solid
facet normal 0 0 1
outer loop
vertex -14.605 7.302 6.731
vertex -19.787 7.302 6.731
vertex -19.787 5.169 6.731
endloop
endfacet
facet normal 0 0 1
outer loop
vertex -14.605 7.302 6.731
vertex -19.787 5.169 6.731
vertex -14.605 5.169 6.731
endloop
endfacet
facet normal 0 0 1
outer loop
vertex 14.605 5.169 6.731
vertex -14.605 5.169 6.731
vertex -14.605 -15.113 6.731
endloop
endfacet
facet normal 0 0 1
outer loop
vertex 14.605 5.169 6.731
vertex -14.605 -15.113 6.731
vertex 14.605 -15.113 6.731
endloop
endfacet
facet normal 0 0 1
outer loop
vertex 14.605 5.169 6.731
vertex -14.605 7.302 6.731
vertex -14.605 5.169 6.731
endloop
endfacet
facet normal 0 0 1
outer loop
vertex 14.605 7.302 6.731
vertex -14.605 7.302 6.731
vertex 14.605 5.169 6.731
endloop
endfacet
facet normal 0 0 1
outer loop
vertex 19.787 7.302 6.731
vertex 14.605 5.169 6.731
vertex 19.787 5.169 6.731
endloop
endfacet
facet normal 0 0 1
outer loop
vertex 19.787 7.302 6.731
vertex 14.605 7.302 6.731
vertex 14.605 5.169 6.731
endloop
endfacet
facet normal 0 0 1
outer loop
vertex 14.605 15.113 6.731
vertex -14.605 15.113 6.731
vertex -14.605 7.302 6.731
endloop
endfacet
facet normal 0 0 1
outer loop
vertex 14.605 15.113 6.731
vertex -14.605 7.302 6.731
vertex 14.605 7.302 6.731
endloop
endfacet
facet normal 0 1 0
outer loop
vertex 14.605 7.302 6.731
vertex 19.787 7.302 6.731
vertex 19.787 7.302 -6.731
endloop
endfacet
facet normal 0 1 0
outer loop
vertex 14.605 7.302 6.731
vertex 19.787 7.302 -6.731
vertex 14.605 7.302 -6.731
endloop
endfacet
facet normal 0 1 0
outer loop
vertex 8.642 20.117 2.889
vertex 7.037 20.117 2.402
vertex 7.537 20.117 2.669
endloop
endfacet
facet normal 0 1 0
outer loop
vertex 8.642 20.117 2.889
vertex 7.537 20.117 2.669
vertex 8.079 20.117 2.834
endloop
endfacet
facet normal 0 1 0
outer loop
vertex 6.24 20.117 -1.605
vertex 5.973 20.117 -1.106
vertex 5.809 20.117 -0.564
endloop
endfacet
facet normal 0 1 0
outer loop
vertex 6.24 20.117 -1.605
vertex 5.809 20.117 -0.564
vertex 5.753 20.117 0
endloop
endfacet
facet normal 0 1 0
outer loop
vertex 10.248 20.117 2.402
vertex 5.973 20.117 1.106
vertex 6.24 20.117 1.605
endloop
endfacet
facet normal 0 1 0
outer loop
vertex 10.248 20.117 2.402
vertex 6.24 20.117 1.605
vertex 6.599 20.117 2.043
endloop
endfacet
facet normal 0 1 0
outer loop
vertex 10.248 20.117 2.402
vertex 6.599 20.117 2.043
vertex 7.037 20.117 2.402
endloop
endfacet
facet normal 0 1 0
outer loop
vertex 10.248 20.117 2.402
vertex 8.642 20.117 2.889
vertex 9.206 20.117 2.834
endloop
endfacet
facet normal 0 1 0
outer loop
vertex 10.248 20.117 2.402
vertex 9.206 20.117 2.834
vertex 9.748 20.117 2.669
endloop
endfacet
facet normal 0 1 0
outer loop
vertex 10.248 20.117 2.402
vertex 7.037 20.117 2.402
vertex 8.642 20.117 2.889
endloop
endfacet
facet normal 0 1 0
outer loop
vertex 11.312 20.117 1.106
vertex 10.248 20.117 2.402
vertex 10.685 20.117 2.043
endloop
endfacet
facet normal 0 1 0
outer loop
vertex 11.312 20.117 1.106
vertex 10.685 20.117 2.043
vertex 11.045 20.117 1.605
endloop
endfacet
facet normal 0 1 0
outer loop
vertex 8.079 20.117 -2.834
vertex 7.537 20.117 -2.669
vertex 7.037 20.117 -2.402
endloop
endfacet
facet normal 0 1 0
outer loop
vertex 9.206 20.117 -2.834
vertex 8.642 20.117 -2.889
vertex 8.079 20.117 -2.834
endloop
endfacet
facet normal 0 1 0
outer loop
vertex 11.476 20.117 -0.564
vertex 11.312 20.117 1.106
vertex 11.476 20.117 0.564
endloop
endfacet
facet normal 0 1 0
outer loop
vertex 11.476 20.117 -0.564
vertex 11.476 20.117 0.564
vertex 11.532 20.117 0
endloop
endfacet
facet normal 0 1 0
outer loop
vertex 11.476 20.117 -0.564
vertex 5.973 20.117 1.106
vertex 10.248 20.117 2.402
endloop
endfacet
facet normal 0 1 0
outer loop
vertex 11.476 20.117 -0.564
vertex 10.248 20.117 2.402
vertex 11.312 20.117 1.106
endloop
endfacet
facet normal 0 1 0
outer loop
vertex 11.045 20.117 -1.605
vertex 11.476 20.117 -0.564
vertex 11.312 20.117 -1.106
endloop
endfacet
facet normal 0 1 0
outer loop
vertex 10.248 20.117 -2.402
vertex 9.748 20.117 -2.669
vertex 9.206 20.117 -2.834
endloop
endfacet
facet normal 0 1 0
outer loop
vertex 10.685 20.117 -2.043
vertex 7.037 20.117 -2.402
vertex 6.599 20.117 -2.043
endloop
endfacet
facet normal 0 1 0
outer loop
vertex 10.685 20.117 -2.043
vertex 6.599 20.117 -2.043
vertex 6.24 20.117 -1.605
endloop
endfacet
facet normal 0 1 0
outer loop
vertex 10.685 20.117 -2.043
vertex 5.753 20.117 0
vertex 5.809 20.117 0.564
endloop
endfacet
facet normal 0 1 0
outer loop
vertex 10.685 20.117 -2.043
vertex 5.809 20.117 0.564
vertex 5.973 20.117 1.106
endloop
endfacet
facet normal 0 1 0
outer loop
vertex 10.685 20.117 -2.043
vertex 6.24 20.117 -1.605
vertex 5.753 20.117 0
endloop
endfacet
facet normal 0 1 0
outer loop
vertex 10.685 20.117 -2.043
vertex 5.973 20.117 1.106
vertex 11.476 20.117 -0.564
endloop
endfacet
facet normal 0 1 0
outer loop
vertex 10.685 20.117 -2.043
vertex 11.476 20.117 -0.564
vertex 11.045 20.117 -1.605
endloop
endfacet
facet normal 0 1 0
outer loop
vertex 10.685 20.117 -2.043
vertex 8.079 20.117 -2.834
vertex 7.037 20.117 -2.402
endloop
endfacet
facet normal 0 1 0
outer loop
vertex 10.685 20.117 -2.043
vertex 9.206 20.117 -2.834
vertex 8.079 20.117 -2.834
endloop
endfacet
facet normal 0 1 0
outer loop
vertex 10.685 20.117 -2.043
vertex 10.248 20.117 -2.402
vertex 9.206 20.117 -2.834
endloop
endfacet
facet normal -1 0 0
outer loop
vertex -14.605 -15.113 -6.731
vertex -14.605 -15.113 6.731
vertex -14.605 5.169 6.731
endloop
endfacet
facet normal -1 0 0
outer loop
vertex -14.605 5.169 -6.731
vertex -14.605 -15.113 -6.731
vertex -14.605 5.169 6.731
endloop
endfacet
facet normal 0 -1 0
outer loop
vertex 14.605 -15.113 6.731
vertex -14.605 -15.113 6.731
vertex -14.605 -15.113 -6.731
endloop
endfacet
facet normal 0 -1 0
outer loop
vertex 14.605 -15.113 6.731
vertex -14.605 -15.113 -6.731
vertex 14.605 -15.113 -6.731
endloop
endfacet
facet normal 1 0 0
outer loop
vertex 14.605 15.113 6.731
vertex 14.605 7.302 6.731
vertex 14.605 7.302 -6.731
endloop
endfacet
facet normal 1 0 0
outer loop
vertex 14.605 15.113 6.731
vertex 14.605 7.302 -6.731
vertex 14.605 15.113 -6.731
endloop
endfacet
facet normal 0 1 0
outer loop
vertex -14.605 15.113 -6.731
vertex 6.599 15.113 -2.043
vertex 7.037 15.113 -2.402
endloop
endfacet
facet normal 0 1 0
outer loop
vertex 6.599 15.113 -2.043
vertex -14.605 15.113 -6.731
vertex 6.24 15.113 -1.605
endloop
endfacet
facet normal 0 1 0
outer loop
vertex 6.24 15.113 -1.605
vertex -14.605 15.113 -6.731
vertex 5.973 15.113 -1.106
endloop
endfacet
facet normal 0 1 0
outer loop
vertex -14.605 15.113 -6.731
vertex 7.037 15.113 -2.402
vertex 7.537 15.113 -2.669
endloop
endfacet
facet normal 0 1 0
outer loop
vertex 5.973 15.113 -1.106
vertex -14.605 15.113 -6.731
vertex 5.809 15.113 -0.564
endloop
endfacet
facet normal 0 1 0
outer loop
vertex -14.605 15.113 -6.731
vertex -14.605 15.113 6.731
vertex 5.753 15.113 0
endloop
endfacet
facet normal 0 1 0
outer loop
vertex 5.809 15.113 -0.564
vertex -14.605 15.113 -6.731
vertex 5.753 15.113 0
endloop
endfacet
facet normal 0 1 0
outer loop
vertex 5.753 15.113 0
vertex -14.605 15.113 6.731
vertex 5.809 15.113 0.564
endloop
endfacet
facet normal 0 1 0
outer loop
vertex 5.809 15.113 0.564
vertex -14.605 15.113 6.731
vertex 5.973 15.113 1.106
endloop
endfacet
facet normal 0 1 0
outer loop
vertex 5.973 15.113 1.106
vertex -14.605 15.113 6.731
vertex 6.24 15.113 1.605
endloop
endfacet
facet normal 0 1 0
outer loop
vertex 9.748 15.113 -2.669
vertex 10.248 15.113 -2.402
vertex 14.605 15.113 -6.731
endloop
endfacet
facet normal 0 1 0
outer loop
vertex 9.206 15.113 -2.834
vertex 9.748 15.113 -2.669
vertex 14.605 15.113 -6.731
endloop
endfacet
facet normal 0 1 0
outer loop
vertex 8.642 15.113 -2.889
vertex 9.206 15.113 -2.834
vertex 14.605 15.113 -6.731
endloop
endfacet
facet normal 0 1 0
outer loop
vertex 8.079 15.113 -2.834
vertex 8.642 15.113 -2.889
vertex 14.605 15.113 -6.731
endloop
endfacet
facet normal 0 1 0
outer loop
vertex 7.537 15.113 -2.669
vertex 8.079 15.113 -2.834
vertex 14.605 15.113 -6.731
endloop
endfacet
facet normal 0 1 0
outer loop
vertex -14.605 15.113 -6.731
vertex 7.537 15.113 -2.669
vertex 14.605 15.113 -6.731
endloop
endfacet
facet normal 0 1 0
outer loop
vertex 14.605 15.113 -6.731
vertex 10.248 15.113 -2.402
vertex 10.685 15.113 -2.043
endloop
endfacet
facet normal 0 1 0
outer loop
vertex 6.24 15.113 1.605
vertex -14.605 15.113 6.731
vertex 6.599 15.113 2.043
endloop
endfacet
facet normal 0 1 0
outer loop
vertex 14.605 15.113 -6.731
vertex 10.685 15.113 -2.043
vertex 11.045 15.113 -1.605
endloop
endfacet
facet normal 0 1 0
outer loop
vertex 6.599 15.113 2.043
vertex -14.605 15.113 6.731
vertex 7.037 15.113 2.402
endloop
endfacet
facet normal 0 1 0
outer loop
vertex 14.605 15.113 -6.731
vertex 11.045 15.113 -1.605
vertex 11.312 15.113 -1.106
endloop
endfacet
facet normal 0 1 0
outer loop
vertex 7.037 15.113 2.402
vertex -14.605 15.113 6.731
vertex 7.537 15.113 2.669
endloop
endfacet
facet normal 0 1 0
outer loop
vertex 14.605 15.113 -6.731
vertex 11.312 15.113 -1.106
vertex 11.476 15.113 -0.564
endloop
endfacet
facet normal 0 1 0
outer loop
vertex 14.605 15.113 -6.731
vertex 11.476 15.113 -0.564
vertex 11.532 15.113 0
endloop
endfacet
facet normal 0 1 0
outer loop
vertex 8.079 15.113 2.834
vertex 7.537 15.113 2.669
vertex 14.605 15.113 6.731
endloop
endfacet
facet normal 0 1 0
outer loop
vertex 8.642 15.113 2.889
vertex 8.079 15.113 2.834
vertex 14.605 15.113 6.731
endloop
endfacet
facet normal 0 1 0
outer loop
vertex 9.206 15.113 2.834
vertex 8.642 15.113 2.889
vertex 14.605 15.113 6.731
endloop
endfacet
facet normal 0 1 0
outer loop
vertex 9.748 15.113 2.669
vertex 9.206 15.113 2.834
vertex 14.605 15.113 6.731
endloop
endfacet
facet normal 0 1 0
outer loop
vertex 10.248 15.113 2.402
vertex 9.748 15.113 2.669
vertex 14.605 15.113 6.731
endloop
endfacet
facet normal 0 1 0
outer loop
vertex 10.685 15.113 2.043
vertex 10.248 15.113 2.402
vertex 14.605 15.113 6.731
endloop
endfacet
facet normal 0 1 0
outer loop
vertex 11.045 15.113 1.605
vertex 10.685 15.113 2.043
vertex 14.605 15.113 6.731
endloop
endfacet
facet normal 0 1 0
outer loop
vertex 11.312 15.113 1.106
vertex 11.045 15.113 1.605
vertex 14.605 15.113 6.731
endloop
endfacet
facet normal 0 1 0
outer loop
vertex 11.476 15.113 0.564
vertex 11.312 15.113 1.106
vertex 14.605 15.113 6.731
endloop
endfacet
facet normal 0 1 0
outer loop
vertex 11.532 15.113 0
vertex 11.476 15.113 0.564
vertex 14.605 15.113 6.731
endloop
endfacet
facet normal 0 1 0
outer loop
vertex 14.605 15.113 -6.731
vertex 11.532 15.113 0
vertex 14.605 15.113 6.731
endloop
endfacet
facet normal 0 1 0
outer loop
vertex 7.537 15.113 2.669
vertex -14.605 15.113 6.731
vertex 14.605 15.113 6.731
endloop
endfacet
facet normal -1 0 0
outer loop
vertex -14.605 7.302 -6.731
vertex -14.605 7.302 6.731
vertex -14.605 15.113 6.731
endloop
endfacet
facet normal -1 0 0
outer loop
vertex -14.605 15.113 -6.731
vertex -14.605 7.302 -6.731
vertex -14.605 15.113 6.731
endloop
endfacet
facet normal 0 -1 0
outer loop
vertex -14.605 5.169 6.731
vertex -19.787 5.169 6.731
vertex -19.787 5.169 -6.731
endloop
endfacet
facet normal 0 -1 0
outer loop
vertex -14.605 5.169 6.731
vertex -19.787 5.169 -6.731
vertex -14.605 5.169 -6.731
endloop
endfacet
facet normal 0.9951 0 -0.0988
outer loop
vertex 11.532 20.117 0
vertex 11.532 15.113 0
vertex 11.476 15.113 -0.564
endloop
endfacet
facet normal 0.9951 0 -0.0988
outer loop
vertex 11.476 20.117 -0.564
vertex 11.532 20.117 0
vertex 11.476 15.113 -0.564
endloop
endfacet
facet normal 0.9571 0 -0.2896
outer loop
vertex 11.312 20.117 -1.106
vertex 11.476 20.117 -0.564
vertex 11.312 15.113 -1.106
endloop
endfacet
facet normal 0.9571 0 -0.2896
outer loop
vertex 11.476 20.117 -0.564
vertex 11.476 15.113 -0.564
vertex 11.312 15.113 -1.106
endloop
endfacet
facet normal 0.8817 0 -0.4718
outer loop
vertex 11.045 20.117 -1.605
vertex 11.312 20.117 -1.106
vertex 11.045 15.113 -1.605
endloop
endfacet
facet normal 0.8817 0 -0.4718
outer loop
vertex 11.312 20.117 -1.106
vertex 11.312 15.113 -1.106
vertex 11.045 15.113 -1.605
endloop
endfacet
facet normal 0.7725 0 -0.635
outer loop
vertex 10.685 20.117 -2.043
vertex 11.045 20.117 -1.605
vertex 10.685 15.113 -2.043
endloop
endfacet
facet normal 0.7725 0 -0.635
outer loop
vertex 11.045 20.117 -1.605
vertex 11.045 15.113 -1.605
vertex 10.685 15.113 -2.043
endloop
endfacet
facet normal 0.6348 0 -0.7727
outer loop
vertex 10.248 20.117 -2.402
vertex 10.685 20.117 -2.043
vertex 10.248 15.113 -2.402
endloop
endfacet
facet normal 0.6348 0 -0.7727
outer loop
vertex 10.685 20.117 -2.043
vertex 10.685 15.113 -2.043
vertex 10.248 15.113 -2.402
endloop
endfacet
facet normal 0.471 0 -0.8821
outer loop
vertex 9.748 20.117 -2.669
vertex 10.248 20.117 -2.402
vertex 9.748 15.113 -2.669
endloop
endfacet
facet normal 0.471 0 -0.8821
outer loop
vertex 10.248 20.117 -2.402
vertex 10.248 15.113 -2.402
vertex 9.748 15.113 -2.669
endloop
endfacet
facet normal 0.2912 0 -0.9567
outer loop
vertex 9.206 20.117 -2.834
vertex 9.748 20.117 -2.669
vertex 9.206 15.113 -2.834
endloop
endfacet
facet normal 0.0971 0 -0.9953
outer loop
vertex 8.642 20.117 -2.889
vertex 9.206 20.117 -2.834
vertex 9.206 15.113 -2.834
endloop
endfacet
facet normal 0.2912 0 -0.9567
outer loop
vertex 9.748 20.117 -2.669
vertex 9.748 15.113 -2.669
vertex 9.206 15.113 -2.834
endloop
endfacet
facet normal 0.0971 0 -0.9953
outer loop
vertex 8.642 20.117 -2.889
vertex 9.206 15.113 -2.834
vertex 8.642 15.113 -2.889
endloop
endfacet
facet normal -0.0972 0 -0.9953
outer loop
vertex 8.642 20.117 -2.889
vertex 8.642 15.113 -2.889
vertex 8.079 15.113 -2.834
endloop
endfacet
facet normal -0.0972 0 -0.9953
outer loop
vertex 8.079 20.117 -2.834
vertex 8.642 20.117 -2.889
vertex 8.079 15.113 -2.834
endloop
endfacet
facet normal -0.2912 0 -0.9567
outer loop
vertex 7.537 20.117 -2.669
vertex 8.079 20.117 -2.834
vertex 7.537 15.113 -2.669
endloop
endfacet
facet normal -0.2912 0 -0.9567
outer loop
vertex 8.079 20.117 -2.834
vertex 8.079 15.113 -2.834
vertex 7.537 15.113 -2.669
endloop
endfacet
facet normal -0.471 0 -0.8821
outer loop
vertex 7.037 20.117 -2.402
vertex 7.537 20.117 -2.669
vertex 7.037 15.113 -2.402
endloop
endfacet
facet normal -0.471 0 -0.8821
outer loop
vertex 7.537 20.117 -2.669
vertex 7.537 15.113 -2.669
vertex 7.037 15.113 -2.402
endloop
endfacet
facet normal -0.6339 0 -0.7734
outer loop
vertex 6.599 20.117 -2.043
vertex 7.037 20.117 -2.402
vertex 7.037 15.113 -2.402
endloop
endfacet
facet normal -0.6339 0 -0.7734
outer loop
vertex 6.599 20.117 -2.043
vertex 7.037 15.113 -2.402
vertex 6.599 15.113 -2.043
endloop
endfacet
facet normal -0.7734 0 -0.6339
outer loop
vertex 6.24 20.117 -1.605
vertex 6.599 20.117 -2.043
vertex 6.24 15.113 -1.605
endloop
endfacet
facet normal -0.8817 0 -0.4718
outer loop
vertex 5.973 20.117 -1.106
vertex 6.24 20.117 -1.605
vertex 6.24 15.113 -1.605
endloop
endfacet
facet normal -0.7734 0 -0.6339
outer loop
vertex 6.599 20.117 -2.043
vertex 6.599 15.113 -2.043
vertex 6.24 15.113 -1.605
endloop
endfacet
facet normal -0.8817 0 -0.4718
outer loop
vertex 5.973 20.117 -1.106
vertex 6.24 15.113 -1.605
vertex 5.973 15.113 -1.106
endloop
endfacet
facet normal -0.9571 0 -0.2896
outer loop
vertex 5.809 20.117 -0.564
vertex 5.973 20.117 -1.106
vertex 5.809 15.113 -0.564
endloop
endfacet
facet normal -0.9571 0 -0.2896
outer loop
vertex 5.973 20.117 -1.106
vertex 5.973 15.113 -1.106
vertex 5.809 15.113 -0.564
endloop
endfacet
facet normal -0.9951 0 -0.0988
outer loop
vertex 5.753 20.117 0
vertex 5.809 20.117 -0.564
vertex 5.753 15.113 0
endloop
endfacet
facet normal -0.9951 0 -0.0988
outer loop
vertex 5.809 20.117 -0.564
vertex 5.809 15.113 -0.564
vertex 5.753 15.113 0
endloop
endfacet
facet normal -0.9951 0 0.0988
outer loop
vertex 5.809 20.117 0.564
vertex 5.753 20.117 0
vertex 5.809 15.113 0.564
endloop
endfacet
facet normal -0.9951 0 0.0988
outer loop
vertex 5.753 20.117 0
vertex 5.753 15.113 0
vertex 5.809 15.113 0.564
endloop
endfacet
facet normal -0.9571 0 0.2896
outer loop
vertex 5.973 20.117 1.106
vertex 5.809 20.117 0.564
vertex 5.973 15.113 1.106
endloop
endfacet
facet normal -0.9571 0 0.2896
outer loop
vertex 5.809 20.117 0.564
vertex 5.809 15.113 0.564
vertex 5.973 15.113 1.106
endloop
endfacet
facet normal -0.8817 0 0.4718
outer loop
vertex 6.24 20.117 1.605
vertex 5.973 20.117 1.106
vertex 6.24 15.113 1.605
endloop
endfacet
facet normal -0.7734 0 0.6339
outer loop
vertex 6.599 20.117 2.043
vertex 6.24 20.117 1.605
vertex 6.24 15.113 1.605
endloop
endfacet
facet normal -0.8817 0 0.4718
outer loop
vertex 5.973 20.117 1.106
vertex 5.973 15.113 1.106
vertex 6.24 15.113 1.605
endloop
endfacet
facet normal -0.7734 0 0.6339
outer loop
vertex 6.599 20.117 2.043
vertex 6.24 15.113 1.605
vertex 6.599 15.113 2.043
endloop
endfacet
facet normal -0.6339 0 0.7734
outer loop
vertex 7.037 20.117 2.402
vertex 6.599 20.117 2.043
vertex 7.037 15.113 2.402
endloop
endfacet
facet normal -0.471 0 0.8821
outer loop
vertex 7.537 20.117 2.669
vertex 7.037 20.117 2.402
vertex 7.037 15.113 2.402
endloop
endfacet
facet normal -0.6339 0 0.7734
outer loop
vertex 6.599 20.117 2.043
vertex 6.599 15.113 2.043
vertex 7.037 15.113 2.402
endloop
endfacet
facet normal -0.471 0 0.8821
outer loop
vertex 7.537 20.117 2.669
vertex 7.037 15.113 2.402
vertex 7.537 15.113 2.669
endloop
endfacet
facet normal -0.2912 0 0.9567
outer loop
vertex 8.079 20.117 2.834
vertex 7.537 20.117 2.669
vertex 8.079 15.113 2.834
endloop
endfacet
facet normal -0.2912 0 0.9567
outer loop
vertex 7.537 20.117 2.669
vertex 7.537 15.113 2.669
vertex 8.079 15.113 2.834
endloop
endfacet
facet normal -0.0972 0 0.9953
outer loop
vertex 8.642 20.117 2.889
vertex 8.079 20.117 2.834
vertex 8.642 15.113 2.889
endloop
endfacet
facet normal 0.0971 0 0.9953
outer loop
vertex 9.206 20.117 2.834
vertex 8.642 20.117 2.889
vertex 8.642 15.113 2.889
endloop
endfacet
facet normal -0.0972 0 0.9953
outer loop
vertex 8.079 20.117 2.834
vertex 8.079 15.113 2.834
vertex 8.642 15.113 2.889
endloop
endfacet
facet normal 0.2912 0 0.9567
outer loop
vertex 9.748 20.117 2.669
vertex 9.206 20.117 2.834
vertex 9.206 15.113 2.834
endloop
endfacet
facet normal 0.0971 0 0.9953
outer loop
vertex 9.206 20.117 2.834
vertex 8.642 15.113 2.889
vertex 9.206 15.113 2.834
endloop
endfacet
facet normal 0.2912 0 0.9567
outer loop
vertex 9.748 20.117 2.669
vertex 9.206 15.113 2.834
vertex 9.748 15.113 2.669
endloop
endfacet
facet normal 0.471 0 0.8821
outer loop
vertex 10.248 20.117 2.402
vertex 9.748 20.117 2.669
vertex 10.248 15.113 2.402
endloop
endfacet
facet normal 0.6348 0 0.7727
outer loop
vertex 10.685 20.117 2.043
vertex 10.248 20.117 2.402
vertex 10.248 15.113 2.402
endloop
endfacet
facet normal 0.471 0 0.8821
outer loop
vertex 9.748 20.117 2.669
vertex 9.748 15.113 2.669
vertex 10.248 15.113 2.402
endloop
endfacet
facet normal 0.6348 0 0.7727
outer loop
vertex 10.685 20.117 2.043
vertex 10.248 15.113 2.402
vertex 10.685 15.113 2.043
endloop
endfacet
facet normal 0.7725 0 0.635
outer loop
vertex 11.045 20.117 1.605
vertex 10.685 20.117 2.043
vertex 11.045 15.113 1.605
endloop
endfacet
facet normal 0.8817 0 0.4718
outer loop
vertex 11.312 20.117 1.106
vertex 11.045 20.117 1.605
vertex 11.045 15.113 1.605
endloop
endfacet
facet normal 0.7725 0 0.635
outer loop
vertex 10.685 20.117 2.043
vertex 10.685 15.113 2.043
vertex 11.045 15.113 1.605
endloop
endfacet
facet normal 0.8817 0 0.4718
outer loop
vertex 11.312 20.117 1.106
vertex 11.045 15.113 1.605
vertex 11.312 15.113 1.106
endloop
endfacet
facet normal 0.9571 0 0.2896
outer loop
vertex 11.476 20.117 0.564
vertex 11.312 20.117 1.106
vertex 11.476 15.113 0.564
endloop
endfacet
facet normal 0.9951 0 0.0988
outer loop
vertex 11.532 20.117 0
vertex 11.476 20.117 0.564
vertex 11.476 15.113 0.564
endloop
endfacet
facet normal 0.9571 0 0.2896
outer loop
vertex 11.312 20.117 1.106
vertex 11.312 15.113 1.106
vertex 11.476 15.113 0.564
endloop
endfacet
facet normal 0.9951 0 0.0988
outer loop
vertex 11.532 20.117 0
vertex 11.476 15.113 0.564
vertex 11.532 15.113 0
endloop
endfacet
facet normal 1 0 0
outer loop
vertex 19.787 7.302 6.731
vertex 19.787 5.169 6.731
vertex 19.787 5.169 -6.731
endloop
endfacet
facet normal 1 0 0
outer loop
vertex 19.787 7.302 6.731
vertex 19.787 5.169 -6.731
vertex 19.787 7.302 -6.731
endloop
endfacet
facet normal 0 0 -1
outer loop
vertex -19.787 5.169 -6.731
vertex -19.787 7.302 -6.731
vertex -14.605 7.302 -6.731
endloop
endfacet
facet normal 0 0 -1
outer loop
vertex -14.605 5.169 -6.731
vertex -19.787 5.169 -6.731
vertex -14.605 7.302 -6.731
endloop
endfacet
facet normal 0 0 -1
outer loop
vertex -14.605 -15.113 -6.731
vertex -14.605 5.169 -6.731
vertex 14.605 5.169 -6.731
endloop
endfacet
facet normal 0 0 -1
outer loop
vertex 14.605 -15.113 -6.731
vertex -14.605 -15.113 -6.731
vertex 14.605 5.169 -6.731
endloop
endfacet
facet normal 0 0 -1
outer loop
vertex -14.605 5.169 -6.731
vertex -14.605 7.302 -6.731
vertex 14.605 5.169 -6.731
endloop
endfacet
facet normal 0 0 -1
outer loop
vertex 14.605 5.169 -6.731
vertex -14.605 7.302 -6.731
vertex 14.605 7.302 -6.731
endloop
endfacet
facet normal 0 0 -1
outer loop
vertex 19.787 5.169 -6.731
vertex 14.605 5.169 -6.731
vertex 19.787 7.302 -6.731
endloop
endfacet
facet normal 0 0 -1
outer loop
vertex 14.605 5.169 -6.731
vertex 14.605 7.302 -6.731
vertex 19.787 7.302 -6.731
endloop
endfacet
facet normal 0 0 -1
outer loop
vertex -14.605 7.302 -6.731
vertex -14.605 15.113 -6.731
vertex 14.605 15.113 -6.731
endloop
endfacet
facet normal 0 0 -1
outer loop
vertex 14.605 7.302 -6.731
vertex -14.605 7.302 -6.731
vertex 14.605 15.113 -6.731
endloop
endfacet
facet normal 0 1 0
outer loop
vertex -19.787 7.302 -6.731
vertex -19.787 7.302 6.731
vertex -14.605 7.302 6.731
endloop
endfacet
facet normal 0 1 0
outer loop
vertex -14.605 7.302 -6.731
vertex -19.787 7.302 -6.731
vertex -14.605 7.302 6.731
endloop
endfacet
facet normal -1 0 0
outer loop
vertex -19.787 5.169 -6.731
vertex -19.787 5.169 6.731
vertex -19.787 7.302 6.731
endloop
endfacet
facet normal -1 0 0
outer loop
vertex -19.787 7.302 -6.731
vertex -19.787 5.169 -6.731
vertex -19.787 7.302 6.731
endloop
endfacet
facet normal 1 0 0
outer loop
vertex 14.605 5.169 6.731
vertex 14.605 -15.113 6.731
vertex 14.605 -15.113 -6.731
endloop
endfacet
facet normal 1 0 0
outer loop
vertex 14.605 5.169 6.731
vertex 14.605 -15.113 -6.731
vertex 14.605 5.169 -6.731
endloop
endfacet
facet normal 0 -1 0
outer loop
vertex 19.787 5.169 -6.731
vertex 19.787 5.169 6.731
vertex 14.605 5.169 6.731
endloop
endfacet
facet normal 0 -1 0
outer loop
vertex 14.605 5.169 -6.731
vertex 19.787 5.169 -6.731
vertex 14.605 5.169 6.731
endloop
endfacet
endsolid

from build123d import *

# Parameters (mm, degrees)
SKETCH1_W           = 29.21
SKETCH1_H           = 30.226
BOSS_EXTRUDE1_DEPTH = 6.731
SKETCH2_W           = 5.1816
SKETCH2_H           = 2.1336
BOSS_EXTRUDE2_DEPTH = 13.462
SKETCH3_R           = 2.88925
BOSS_EXTRUDE3_DEPTH = 5.0038


with BuildPart() as part:
    # Sketch1 → Boss-Extrude1 (new body, symmetric)
    with BuildSketch(Plane.XY):
        Rectangle(SKETCH1_W, SKETCH1_H)
    extrude(amount=BOSS_EXTRUDE1_DEPTH, both=True)

    # Sketch2 → Boss-Extrude2 (add)
    with BuildSketch(Plane.XY.offset(6.731)):
        with Locations((-17.1958, 6.2357)):
            Rectangle(SKETCH2_W, SKETCH2_H)
    boss_extrude2 = extrude(amount=-BOSS_EXTRUDE2_DEPTH)

    # Mirror1: Boss-Extrude2 across plane
    add(boss_extrude2.mirror(Plane(origin=(0, 0, 0), x_dir=(0, 0, 1), z_dir=(1, 0, 0))))

    # Sketch3 → Boss-Extrude3 (add)
    with BuildSketch(Plane(origin=(0, 15.113, 0), x_dir=(1, 0, 0), z_dir=(0, 1, 0))):
        with Locations((8.64235, 0)):
            Circle(SKETCH3_R)
    extrude(amount=BOSS_EXTRUDE3_DEPTH)


solid = part.part
